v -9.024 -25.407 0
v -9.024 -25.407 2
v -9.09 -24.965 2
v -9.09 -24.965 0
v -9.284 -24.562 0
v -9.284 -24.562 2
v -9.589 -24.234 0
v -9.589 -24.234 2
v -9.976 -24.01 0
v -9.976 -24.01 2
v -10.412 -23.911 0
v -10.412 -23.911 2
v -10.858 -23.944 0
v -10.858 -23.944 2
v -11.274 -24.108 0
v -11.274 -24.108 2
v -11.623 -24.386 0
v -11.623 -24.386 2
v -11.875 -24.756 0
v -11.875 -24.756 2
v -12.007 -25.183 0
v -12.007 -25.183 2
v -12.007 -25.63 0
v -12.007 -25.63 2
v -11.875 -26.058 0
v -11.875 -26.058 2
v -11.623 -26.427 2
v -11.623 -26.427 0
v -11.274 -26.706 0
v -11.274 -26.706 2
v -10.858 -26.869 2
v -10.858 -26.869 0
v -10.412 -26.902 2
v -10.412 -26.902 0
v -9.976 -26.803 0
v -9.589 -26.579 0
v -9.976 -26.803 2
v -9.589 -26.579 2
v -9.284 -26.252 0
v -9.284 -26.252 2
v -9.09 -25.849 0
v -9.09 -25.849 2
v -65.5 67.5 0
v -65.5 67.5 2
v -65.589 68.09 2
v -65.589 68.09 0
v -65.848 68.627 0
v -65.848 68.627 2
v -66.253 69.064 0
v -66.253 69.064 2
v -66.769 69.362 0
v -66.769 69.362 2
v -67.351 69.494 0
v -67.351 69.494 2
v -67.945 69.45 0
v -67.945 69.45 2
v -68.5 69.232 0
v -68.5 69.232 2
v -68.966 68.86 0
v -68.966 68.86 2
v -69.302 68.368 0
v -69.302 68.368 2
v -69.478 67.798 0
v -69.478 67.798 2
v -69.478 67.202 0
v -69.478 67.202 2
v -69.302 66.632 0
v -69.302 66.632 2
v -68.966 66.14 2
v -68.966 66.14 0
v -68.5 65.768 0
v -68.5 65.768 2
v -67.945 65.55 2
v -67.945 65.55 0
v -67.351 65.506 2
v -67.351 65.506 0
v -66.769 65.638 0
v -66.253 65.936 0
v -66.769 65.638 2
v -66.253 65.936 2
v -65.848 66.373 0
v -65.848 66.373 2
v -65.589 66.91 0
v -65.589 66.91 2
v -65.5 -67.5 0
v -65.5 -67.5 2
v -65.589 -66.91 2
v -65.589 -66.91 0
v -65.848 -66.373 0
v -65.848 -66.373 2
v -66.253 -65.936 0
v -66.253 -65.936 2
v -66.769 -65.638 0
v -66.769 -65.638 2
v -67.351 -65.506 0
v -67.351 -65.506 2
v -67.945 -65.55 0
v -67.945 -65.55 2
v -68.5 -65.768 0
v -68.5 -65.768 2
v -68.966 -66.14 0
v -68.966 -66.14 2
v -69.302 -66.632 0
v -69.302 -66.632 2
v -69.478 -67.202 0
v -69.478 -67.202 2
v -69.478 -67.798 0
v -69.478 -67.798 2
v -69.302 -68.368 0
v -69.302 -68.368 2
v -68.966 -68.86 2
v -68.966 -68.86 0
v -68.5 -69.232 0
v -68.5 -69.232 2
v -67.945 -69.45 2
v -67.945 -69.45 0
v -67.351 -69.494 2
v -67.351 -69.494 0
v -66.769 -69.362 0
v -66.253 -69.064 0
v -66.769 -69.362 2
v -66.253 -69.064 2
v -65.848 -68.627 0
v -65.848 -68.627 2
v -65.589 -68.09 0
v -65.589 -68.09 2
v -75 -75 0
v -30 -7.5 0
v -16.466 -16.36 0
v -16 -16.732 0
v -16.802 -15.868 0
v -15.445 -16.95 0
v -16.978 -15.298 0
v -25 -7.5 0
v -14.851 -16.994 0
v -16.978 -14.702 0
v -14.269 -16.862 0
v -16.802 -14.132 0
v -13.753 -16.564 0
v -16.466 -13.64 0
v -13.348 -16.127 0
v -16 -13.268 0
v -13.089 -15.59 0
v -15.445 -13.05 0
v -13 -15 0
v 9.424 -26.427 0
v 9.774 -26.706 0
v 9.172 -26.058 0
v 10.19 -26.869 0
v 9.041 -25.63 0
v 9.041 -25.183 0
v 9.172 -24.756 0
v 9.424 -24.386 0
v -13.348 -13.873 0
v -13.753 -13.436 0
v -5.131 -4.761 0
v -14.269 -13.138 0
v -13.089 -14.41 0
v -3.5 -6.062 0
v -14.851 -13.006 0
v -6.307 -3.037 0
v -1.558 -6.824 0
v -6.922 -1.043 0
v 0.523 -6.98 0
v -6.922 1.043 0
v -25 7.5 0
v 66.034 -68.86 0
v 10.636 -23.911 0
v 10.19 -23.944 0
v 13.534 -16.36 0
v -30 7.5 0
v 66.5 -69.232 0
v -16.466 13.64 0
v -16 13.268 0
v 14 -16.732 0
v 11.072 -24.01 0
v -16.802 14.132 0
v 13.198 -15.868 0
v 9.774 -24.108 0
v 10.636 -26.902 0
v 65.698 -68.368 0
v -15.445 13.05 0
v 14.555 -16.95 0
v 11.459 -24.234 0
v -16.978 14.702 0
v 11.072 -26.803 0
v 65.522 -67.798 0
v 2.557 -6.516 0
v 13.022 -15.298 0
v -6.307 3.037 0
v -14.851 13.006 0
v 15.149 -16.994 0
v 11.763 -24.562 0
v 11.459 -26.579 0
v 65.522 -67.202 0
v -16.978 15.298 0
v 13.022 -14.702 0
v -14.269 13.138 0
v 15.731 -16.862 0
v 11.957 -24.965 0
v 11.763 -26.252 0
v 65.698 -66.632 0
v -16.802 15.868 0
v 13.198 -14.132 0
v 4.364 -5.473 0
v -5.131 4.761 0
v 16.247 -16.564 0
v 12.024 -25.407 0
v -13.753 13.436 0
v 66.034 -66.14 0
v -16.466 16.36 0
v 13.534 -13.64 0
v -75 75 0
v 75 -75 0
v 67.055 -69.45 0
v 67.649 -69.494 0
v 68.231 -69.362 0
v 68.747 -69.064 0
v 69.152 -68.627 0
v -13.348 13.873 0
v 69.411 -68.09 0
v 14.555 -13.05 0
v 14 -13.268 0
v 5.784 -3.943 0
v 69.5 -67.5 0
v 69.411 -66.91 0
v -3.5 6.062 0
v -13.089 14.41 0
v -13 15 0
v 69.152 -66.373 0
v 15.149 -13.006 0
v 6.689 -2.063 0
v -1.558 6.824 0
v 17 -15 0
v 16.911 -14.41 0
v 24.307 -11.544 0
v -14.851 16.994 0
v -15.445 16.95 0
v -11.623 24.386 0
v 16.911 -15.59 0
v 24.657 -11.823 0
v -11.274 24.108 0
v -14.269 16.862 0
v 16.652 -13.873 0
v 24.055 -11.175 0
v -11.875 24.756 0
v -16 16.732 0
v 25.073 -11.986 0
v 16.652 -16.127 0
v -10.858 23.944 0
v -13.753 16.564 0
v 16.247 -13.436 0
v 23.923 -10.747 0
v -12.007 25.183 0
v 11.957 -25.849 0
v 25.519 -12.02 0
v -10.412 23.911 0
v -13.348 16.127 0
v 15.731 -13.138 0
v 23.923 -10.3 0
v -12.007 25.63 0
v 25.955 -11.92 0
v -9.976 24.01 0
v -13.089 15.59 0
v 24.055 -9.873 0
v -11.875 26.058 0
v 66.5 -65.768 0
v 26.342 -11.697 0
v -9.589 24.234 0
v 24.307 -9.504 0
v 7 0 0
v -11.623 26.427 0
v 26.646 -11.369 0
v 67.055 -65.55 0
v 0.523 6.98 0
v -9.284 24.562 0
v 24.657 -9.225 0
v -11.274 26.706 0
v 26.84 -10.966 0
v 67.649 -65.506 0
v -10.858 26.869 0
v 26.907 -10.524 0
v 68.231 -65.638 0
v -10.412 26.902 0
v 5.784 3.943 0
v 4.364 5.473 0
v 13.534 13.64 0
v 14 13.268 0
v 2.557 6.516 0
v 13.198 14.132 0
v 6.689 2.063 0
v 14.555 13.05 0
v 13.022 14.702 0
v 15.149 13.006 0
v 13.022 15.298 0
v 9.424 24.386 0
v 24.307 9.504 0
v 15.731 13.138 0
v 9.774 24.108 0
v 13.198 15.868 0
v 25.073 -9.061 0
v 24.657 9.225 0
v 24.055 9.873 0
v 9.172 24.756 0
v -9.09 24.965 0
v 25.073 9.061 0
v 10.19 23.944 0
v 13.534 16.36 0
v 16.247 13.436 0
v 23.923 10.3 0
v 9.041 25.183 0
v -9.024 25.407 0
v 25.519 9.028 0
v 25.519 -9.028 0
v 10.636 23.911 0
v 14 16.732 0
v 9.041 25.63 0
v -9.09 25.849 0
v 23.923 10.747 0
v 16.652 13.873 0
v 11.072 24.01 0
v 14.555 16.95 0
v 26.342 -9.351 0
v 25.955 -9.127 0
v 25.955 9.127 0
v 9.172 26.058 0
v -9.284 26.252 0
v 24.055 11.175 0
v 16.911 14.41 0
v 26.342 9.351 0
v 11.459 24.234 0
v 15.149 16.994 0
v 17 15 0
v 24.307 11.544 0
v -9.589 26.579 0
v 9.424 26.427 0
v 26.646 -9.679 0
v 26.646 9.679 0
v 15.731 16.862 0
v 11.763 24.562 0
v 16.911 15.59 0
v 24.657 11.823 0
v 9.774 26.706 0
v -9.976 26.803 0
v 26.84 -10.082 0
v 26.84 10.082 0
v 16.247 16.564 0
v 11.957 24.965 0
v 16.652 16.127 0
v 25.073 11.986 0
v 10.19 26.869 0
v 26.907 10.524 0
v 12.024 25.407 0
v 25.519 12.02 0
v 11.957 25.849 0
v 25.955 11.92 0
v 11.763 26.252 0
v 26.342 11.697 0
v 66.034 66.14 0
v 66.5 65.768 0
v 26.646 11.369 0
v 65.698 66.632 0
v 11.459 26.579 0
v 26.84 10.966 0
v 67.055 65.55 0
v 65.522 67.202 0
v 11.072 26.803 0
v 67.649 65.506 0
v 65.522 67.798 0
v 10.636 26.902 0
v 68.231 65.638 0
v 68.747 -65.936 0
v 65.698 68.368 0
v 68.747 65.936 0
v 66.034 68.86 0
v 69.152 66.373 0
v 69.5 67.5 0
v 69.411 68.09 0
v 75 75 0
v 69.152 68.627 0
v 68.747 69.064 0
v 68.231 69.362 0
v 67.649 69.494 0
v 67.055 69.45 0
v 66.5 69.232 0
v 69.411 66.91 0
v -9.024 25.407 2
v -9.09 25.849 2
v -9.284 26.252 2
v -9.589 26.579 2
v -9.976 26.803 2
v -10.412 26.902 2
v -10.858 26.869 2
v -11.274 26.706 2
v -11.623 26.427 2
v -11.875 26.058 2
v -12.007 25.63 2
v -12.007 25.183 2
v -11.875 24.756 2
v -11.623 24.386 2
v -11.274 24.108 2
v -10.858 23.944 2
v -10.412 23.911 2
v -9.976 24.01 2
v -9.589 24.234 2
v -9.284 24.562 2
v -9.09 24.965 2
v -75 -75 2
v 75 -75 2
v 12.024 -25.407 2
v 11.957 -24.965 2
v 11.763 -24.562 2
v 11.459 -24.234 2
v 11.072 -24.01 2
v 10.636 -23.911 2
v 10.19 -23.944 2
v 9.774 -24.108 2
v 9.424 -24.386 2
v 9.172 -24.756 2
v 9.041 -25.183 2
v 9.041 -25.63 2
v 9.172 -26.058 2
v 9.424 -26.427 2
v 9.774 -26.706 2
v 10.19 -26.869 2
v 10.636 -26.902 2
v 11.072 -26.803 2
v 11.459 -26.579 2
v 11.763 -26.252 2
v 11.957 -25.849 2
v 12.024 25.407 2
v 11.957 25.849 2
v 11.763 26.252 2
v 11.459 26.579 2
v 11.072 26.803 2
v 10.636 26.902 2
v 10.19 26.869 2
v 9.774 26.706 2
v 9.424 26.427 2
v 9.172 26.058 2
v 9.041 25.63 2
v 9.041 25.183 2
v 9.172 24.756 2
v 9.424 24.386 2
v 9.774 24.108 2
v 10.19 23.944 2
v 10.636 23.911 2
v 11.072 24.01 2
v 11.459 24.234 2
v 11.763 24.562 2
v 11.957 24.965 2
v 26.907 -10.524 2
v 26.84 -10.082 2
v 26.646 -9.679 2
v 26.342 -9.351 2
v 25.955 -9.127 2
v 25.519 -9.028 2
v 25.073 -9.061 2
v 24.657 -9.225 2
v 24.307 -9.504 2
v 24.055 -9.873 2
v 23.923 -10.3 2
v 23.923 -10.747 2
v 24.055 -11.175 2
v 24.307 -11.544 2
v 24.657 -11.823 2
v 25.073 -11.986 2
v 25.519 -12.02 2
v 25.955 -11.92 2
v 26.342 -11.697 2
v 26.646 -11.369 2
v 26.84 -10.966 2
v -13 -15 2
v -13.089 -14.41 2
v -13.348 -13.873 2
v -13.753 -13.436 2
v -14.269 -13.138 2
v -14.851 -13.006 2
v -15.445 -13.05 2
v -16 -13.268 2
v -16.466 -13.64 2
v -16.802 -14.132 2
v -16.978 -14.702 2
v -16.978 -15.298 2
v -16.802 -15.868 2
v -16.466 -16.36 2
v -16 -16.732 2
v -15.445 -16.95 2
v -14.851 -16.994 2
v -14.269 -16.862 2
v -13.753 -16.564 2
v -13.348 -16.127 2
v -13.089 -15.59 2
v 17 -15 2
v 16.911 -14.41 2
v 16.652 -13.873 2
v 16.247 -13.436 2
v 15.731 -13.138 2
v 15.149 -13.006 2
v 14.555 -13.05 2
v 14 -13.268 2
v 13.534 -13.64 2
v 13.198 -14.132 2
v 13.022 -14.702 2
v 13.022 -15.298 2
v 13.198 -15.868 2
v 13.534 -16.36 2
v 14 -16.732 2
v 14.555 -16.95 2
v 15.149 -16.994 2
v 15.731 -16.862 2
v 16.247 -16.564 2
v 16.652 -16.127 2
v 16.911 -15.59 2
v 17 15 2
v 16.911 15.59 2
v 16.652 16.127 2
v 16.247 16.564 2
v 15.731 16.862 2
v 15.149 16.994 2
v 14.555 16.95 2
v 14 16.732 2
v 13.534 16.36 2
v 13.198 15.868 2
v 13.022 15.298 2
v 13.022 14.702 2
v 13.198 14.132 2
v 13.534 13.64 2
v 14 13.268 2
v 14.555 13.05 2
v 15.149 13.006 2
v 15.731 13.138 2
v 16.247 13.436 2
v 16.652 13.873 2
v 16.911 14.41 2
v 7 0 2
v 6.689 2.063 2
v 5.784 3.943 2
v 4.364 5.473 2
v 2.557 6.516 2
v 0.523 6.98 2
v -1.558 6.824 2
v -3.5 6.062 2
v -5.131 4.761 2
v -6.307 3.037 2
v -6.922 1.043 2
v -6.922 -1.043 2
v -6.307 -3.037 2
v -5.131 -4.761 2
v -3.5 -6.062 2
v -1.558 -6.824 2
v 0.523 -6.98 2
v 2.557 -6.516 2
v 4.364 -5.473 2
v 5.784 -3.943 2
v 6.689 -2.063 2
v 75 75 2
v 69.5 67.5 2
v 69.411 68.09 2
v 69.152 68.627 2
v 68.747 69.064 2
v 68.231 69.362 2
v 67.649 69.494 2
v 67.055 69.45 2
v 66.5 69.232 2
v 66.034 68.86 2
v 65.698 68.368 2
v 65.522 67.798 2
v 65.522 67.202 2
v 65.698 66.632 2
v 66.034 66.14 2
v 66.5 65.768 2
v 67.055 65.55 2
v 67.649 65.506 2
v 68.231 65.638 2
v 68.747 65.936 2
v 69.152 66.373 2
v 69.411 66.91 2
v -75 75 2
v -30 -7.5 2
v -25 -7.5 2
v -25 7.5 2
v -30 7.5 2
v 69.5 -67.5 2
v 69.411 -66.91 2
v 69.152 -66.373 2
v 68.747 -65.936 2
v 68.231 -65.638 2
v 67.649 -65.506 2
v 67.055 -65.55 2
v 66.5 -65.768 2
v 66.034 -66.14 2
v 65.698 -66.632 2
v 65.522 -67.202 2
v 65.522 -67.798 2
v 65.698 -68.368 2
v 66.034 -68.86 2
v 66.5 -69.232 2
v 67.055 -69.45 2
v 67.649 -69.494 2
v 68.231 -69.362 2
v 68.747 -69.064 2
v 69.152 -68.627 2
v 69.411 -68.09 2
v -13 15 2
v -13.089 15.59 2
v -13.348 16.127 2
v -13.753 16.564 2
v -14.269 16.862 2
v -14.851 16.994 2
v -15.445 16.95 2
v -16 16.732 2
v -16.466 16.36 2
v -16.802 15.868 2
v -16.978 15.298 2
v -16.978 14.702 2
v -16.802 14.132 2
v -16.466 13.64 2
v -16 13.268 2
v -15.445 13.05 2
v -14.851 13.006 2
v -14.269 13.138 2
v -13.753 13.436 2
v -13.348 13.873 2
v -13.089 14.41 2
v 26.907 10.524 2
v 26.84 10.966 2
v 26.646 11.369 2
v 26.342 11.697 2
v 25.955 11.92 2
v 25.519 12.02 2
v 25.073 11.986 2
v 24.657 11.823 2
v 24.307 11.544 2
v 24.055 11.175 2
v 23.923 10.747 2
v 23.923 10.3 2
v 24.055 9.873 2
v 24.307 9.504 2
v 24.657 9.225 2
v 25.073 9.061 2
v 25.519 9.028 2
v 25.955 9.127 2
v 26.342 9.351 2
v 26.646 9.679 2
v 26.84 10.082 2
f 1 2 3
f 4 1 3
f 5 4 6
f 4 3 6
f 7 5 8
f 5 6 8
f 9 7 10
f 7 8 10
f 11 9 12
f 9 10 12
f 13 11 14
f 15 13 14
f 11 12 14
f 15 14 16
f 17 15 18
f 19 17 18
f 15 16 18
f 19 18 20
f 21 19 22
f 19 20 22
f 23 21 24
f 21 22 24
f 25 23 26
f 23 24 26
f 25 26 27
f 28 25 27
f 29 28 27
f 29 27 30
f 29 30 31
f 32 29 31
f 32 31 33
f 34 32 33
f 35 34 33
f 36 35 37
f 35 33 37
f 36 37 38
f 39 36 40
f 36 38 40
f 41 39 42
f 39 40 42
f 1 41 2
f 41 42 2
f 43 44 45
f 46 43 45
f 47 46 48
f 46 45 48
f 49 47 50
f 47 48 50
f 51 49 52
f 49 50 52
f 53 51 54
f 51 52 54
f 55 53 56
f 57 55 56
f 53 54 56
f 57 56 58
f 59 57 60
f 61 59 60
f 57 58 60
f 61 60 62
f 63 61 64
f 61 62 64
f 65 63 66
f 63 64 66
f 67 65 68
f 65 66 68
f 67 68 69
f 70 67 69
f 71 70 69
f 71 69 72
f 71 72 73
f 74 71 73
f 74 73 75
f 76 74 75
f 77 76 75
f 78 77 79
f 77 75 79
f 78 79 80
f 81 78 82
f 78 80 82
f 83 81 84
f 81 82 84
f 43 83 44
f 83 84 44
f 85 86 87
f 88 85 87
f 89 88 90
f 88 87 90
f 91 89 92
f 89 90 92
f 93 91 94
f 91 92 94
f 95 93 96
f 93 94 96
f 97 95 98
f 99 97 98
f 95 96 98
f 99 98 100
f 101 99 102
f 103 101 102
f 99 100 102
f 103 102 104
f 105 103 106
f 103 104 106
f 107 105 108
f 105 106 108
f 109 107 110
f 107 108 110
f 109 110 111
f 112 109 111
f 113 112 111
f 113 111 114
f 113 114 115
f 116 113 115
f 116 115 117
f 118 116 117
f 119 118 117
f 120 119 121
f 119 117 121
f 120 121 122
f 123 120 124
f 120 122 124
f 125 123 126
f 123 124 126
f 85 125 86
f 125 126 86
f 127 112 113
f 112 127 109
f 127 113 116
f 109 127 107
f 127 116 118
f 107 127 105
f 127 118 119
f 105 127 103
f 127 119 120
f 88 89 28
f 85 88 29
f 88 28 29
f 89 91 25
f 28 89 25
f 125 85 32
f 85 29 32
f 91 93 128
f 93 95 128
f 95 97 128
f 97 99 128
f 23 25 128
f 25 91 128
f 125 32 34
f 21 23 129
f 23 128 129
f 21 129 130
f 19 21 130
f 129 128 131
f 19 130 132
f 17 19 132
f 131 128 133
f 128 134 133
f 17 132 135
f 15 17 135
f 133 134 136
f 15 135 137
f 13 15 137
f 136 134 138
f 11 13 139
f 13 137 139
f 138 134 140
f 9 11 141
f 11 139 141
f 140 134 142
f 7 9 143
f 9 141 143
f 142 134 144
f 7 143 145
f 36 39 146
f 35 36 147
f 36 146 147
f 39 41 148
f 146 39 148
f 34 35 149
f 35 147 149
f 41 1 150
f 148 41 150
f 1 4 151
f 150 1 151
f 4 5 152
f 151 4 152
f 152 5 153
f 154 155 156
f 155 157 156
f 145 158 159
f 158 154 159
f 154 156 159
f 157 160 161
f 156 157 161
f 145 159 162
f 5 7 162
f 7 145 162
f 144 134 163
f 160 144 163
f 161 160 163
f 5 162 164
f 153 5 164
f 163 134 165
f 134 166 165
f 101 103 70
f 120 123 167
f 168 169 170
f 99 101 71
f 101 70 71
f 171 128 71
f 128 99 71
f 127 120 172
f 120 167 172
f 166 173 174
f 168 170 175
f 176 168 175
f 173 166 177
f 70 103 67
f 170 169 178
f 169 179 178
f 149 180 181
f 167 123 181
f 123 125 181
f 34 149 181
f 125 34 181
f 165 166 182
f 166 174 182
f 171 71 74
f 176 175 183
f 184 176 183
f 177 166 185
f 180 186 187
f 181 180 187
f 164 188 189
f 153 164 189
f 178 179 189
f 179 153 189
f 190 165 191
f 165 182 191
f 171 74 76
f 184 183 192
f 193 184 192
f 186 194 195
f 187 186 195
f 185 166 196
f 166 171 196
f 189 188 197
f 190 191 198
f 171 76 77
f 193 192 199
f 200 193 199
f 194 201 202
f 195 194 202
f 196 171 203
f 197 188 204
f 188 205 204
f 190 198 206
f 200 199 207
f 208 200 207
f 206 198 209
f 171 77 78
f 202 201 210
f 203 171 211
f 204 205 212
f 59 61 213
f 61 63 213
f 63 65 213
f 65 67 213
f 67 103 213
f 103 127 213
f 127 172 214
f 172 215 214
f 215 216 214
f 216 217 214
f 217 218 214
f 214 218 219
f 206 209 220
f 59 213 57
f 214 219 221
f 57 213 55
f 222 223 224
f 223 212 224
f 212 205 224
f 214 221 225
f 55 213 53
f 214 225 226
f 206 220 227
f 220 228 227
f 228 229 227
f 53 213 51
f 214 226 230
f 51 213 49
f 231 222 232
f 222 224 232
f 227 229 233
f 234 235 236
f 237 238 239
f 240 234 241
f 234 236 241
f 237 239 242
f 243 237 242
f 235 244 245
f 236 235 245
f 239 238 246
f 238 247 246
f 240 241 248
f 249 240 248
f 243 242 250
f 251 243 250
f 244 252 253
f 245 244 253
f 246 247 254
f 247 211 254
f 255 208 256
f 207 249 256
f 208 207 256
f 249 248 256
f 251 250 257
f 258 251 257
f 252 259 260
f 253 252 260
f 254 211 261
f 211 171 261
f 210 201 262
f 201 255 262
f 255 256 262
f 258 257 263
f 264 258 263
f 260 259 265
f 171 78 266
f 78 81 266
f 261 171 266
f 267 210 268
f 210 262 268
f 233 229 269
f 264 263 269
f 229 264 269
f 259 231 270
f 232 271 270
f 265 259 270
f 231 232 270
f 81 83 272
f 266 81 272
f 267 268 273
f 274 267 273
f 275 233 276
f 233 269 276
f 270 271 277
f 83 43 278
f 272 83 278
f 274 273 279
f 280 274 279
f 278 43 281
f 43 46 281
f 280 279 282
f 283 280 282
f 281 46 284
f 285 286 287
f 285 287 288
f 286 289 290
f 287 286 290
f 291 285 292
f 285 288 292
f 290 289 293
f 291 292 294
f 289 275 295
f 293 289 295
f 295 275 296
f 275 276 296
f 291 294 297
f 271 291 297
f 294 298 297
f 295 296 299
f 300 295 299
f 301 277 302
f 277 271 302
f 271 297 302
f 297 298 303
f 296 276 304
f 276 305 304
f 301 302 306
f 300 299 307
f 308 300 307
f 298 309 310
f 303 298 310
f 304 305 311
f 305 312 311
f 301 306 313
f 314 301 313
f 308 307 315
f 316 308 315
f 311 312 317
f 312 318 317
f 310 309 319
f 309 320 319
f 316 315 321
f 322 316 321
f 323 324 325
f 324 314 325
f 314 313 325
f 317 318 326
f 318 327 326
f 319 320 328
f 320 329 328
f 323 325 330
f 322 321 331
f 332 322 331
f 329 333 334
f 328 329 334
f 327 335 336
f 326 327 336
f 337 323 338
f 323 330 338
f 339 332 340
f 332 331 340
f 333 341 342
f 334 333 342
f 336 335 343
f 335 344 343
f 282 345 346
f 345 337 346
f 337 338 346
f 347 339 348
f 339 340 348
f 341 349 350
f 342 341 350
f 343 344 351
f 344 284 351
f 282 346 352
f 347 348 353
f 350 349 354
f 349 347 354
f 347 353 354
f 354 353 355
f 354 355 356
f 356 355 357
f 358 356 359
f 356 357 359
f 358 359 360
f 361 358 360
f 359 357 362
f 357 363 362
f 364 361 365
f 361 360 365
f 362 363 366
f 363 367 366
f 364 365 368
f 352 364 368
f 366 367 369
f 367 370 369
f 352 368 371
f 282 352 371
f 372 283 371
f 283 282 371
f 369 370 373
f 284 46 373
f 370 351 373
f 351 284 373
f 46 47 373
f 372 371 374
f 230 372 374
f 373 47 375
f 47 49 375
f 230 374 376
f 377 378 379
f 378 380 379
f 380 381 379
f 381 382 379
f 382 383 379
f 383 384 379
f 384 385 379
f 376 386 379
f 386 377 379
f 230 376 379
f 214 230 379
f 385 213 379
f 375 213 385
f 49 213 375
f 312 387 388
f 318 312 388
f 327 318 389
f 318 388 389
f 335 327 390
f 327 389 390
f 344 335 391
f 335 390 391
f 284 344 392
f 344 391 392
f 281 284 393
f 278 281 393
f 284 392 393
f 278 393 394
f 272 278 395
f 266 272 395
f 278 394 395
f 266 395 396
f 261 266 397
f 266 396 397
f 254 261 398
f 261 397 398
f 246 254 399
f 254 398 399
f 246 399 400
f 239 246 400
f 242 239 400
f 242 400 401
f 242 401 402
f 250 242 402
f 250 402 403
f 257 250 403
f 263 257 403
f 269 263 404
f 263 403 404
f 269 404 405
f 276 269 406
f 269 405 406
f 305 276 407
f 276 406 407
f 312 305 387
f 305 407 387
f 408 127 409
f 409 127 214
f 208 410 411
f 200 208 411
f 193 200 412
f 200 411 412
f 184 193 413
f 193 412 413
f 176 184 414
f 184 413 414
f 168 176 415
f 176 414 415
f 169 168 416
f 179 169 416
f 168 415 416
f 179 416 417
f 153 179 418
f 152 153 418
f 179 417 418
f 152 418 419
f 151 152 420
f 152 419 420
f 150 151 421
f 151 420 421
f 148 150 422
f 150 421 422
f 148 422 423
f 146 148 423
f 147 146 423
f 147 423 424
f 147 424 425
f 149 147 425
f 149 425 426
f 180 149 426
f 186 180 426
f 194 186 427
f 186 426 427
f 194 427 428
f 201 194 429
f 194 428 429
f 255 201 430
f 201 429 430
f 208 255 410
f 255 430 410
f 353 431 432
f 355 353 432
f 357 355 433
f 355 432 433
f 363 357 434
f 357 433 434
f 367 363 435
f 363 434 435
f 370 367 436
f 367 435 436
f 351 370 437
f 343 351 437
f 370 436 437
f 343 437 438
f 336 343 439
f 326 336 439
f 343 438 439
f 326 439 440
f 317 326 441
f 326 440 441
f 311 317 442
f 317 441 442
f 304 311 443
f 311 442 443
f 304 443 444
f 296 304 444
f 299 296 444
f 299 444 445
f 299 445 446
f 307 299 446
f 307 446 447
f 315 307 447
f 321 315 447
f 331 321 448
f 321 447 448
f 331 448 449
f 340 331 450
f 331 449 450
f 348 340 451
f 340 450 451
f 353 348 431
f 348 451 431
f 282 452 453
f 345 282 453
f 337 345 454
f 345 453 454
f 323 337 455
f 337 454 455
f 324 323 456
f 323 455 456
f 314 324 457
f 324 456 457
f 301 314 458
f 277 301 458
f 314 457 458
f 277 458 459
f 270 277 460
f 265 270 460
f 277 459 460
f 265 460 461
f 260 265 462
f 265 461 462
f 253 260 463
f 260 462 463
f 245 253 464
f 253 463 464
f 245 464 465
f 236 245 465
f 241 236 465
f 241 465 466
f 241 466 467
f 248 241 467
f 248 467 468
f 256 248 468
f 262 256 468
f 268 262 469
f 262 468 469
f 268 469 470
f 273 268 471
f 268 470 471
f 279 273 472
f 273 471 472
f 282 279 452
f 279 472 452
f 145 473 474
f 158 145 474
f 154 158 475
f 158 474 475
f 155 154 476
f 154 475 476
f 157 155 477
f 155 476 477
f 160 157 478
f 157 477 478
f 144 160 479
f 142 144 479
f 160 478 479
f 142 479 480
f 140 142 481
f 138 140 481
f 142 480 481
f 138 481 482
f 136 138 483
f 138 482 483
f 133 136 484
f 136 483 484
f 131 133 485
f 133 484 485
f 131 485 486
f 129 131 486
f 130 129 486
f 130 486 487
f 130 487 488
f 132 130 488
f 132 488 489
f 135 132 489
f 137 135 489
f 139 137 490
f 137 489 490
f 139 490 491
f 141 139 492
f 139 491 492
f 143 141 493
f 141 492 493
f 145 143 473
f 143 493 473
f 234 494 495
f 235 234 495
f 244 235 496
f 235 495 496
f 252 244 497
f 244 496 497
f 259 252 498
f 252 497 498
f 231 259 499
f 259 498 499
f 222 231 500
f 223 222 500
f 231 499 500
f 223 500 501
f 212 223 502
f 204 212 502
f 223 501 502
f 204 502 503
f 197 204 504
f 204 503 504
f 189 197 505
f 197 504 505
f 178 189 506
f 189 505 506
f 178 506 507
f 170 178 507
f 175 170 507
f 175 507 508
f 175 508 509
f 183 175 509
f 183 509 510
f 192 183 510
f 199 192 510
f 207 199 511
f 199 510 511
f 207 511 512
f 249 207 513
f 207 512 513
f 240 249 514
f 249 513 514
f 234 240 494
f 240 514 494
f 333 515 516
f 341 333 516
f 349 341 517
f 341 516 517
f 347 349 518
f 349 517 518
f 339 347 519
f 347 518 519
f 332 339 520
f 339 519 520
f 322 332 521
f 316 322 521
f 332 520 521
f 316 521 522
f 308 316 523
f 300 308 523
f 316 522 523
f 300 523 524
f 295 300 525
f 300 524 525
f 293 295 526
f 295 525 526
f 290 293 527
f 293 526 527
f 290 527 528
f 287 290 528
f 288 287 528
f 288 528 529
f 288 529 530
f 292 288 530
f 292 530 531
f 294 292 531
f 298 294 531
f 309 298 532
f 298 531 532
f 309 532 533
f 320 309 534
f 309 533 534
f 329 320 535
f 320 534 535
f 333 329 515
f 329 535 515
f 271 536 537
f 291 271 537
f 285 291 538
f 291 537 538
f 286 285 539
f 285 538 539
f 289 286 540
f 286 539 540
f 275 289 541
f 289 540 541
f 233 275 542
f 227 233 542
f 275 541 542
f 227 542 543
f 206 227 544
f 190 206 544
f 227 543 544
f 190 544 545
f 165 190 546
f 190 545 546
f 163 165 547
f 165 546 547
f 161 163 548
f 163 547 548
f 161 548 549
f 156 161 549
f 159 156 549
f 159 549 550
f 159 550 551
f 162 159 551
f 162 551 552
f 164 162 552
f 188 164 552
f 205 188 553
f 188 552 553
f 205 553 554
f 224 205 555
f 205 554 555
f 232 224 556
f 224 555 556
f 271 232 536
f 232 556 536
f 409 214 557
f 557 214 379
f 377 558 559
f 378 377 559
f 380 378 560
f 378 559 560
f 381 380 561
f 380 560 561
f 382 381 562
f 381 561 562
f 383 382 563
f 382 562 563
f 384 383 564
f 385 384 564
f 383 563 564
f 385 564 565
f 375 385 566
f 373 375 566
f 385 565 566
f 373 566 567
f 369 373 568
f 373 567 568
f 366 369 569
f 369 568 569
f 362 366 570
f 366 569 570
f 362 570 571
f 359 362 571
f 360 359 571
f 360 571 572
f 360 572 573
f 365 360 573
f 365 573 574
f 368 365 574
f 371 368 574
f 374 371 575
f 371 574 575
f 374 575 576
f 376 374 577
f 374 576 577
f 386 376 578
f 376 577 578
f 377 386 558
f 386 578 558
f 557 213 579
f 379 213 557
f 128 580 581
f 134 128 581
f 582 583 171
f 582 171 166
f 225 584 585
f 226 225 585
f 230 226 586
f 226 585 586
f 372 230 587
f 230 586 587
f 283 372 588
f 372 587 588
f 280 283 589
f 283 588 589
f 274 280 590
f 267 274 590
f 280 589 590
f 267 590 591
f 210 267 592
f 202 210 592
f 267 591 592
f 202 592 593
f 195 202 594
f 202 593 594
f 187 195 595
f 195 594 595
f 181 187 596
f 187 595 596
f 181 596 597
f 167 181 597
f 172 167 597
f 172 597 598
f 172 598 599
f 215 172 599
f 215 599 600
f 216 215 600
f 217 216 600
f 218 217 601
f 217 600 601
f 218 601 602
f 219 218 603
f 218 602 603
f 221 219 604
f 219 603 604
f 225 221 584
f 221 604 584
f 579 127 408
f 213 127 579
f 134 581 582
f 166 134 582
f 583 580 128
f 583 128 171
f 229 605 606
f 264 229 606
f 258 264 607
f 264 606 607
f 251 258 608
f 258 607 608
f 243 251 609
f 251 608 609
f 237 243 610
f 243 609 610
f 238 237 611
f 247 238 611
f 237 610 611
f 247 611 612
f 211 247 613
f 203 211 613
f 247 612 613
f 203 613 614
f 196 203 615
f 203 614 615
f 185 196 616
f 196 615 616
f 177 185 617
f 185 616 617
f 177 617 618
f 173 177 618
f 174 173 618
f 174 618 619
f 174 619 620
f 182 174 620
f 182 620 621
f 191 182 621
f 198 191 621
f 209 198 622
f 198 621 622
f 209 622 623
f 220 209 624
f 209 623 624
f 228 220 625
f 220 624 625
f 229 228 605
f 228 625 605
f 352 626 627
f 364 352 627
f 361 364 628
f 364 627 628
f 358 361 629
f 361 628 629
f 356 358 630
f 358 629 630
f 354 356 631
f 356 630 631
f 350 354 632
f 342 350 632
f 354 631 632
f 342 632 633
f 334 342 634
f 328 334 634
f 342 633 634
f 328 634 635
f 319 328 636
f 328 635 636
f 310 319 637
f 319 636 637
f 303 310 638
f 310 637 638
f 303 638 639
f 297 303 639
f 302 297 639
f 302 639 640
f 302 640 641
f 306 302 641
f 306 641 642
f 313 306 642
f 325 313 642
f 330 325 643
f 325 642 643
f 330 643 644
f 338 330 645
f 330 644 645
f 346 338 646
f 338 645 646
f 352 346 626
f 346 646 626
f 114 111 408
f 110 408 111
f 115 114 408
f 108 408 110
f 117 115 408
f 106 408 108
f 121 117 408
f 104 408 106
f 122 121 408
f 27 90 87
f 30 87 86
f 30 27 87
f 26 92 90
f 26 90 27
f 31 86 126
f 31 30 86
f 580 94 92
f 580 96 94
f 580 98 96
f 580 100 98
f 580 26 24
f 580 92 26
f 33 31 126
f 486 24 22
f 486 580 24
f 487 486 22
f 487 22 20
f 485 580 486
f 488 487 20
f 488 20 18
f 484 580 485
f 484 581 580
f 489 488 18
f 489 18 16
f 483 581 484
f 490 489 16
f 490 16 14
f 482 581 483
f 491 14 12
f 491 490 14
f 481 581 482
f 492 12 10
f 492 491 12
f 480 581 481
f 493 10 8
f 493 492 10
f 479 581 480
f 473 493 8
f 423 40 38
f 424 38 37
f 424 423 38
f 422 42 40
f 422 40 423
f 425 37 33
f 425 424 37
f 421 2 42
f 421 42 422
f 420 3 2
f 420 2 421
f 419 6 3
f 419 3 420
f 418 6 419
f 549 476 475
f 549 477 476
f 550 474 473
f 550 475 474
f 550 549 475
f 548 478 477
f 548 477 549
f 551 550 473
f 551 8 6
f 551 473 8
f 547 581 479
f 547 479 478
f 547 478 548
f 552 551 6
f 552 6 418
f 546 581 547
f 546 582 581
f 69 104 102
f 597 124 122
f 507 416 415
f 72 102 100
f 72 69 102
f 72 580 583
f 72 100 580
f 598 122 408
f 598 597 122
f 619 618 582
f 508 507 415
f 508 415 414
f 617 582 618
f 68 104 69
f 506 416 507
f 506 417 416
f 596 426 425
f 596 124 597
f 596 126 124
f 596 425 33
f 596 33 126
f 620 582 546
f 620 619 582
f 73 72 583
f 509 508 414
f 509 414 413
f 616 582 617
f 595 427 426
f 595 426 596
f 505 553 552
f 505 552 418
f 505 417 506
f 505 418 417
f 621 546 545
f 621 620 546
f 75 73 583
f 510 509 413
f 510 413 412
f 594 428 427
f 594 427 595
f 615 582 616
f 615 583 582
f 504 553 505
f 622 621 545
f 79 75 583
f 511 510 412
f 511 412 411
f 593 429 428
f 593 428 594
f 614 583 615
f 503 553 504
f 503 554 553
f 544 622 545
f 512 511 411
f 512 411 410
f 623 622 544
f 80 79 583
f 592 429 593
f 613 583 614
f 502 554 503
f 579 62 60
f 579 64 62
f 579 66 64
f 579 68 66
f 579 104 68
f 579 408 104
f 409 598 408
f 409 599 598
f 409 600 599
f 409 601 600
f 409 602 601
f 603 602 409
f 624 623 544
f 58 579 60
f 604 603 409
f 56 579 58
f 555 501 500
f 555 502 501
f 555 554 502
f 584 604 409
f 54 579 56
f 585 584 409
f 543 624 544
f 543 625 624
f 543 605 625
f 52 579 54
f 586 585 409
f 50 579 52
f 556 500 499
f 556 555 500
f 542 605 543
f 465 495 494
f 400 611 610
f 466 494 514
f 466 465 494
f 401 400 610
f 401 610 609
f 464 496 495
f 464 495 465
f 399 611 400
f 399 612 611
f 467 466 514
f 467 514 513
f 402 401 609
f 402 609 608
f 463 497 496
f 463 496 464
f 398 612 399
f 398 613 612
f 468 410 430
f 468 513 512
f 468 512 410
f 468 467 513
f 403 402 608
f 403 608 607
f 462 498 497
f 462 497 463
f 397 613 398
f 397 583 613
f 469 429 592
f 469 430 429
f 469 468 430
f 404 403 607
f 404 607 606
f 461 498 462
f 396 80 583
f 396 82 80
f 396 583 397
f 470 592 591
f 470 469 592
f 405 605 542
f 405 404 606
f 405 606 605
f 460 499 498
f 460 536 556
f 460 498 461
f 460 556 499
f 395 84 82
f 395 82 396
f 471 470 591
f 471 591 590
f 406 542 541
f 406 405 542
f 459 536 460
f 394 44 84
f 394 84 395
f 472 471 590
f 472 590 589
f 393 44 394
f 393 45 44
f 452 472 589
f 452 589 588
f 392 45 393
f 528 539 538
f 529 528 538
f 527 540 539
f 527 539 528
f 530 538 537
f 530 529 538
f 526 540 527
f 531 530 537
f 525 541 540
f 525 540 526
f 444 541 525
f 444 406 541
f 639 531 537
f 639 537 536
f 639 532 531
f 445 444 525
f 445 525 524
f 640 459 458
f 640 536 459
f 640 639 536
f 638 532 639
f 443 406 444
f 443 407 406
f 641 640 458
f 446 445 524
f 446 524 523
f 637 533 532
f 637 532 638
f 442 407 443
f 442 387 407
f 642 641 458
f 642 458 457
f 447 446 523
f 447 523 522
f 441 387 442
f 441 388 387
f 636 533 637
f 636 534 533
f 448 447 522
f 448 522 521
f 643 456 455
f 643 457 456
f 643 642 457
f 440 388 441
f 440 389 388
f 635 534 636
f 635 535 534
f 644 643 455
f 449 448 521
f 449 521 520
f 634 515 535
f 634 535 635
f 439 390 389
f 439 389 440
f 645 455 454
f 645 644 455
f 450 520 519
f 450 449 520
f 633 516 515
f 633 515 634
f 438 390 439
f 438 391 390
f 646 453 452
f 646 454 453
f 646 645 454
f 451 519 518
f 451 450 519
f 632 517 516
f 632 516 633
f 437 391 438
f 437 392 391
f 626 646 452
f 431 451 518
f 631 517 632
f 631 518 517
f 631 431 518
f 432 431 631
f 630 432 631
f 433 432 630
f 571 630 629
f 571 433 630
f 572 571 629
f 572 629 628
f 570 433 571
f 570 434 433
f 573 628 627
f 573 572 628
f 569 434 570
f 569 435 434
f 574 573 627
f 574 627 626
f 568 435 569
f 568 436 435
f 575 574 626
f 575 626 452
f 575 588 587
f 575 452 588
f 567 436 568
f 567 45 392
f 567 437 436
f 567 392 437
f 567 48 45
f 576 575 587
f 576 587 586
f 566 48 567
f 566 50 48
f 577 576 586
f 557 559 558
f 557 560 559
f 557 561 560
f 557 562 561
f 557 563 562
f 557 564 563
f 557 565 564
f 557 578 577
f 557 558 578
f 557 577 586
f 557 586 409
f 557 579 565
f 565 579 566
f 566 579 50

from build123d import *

# Parameters (mm, degrees)
CROQUIS1_W              = 150
CROQUIS1_H              = 150
SALIENTE_EXTRUIR1_DEPTH = 2
CROQUIS2_R              = 2
CROQUIS2_R_2            = 7
CROQUIS2_R_3            = 1.5
CROQUIS2_W              = 5
CROQUIS2_H              = 15
CORTAR_EXTRUIR1_DEPTH   = 2


with BuildPart() as part:
    # Croquis1 → Saliente-Extruir1 (new body)
    with BuildSketch(Plane.XY):
        Rectangle(CROQUIS1_W, CROQUIS1_H)
    extrude(amount=SALIENTE_EXTRUIR1_DEPTH)

    # Croquis2 → Cortar-Extruir1 (cut)
    with BuildSketch(Plane.XY.offset(2)):
        with Locations((-67.5, -67.5)):
            Circle(CROQUIS2_R)
        with Locations((67.5, -67.5)):
            Circle(CROQUIS2_R)
        with Locations((67.5, 67.5)):
            Circle(CROQUIS2_R)
        with Locations((-67.5, 67.5)):
            Circle(CROQUIS2_R)
        Circle(CROQUIS2_R_2)
        with Locations((-15, -15)):
            Circle(CROQUIS2_R)
        with Locations((15, -15)):
            Circle(CROQUIS2_R)
        with Locations((15, 15)):
            Circle(CROQUIS2_R)
        with Locations((-15, 15)):
            Circle(CROQUIS2_R)
        with Locations((-10.52379439, 25.406687144)):
            Circle(CROQUIS2_R_3)
        with Locations((10.52379439, 25.406687144)):
            Circle(CROQUIS2_R_3)
        with Locations((25.406687144, 10.52379439)):
            Circle(CROQUIS2_R_3)
        with Locations((25.406687144, -10.52379439)):
            Circle(CROQUIS2_R_3)
        with Locations((10.52379439, -25.406687144)):
            Circle(CROQUIS2_R_3)
        with Locations((-10.52379439, -25.406687144)):
            Circle(CROQUIS2_R_3)
        with Locations((-27.5, 0)):
            Rectangle(CROQUIS2_W, CROQUIS2_H)
    extrude(amount=-CORTAR_EXTRUIR1_DEPTH, mode=Mode.SUBTRACT)


solid = part.part
